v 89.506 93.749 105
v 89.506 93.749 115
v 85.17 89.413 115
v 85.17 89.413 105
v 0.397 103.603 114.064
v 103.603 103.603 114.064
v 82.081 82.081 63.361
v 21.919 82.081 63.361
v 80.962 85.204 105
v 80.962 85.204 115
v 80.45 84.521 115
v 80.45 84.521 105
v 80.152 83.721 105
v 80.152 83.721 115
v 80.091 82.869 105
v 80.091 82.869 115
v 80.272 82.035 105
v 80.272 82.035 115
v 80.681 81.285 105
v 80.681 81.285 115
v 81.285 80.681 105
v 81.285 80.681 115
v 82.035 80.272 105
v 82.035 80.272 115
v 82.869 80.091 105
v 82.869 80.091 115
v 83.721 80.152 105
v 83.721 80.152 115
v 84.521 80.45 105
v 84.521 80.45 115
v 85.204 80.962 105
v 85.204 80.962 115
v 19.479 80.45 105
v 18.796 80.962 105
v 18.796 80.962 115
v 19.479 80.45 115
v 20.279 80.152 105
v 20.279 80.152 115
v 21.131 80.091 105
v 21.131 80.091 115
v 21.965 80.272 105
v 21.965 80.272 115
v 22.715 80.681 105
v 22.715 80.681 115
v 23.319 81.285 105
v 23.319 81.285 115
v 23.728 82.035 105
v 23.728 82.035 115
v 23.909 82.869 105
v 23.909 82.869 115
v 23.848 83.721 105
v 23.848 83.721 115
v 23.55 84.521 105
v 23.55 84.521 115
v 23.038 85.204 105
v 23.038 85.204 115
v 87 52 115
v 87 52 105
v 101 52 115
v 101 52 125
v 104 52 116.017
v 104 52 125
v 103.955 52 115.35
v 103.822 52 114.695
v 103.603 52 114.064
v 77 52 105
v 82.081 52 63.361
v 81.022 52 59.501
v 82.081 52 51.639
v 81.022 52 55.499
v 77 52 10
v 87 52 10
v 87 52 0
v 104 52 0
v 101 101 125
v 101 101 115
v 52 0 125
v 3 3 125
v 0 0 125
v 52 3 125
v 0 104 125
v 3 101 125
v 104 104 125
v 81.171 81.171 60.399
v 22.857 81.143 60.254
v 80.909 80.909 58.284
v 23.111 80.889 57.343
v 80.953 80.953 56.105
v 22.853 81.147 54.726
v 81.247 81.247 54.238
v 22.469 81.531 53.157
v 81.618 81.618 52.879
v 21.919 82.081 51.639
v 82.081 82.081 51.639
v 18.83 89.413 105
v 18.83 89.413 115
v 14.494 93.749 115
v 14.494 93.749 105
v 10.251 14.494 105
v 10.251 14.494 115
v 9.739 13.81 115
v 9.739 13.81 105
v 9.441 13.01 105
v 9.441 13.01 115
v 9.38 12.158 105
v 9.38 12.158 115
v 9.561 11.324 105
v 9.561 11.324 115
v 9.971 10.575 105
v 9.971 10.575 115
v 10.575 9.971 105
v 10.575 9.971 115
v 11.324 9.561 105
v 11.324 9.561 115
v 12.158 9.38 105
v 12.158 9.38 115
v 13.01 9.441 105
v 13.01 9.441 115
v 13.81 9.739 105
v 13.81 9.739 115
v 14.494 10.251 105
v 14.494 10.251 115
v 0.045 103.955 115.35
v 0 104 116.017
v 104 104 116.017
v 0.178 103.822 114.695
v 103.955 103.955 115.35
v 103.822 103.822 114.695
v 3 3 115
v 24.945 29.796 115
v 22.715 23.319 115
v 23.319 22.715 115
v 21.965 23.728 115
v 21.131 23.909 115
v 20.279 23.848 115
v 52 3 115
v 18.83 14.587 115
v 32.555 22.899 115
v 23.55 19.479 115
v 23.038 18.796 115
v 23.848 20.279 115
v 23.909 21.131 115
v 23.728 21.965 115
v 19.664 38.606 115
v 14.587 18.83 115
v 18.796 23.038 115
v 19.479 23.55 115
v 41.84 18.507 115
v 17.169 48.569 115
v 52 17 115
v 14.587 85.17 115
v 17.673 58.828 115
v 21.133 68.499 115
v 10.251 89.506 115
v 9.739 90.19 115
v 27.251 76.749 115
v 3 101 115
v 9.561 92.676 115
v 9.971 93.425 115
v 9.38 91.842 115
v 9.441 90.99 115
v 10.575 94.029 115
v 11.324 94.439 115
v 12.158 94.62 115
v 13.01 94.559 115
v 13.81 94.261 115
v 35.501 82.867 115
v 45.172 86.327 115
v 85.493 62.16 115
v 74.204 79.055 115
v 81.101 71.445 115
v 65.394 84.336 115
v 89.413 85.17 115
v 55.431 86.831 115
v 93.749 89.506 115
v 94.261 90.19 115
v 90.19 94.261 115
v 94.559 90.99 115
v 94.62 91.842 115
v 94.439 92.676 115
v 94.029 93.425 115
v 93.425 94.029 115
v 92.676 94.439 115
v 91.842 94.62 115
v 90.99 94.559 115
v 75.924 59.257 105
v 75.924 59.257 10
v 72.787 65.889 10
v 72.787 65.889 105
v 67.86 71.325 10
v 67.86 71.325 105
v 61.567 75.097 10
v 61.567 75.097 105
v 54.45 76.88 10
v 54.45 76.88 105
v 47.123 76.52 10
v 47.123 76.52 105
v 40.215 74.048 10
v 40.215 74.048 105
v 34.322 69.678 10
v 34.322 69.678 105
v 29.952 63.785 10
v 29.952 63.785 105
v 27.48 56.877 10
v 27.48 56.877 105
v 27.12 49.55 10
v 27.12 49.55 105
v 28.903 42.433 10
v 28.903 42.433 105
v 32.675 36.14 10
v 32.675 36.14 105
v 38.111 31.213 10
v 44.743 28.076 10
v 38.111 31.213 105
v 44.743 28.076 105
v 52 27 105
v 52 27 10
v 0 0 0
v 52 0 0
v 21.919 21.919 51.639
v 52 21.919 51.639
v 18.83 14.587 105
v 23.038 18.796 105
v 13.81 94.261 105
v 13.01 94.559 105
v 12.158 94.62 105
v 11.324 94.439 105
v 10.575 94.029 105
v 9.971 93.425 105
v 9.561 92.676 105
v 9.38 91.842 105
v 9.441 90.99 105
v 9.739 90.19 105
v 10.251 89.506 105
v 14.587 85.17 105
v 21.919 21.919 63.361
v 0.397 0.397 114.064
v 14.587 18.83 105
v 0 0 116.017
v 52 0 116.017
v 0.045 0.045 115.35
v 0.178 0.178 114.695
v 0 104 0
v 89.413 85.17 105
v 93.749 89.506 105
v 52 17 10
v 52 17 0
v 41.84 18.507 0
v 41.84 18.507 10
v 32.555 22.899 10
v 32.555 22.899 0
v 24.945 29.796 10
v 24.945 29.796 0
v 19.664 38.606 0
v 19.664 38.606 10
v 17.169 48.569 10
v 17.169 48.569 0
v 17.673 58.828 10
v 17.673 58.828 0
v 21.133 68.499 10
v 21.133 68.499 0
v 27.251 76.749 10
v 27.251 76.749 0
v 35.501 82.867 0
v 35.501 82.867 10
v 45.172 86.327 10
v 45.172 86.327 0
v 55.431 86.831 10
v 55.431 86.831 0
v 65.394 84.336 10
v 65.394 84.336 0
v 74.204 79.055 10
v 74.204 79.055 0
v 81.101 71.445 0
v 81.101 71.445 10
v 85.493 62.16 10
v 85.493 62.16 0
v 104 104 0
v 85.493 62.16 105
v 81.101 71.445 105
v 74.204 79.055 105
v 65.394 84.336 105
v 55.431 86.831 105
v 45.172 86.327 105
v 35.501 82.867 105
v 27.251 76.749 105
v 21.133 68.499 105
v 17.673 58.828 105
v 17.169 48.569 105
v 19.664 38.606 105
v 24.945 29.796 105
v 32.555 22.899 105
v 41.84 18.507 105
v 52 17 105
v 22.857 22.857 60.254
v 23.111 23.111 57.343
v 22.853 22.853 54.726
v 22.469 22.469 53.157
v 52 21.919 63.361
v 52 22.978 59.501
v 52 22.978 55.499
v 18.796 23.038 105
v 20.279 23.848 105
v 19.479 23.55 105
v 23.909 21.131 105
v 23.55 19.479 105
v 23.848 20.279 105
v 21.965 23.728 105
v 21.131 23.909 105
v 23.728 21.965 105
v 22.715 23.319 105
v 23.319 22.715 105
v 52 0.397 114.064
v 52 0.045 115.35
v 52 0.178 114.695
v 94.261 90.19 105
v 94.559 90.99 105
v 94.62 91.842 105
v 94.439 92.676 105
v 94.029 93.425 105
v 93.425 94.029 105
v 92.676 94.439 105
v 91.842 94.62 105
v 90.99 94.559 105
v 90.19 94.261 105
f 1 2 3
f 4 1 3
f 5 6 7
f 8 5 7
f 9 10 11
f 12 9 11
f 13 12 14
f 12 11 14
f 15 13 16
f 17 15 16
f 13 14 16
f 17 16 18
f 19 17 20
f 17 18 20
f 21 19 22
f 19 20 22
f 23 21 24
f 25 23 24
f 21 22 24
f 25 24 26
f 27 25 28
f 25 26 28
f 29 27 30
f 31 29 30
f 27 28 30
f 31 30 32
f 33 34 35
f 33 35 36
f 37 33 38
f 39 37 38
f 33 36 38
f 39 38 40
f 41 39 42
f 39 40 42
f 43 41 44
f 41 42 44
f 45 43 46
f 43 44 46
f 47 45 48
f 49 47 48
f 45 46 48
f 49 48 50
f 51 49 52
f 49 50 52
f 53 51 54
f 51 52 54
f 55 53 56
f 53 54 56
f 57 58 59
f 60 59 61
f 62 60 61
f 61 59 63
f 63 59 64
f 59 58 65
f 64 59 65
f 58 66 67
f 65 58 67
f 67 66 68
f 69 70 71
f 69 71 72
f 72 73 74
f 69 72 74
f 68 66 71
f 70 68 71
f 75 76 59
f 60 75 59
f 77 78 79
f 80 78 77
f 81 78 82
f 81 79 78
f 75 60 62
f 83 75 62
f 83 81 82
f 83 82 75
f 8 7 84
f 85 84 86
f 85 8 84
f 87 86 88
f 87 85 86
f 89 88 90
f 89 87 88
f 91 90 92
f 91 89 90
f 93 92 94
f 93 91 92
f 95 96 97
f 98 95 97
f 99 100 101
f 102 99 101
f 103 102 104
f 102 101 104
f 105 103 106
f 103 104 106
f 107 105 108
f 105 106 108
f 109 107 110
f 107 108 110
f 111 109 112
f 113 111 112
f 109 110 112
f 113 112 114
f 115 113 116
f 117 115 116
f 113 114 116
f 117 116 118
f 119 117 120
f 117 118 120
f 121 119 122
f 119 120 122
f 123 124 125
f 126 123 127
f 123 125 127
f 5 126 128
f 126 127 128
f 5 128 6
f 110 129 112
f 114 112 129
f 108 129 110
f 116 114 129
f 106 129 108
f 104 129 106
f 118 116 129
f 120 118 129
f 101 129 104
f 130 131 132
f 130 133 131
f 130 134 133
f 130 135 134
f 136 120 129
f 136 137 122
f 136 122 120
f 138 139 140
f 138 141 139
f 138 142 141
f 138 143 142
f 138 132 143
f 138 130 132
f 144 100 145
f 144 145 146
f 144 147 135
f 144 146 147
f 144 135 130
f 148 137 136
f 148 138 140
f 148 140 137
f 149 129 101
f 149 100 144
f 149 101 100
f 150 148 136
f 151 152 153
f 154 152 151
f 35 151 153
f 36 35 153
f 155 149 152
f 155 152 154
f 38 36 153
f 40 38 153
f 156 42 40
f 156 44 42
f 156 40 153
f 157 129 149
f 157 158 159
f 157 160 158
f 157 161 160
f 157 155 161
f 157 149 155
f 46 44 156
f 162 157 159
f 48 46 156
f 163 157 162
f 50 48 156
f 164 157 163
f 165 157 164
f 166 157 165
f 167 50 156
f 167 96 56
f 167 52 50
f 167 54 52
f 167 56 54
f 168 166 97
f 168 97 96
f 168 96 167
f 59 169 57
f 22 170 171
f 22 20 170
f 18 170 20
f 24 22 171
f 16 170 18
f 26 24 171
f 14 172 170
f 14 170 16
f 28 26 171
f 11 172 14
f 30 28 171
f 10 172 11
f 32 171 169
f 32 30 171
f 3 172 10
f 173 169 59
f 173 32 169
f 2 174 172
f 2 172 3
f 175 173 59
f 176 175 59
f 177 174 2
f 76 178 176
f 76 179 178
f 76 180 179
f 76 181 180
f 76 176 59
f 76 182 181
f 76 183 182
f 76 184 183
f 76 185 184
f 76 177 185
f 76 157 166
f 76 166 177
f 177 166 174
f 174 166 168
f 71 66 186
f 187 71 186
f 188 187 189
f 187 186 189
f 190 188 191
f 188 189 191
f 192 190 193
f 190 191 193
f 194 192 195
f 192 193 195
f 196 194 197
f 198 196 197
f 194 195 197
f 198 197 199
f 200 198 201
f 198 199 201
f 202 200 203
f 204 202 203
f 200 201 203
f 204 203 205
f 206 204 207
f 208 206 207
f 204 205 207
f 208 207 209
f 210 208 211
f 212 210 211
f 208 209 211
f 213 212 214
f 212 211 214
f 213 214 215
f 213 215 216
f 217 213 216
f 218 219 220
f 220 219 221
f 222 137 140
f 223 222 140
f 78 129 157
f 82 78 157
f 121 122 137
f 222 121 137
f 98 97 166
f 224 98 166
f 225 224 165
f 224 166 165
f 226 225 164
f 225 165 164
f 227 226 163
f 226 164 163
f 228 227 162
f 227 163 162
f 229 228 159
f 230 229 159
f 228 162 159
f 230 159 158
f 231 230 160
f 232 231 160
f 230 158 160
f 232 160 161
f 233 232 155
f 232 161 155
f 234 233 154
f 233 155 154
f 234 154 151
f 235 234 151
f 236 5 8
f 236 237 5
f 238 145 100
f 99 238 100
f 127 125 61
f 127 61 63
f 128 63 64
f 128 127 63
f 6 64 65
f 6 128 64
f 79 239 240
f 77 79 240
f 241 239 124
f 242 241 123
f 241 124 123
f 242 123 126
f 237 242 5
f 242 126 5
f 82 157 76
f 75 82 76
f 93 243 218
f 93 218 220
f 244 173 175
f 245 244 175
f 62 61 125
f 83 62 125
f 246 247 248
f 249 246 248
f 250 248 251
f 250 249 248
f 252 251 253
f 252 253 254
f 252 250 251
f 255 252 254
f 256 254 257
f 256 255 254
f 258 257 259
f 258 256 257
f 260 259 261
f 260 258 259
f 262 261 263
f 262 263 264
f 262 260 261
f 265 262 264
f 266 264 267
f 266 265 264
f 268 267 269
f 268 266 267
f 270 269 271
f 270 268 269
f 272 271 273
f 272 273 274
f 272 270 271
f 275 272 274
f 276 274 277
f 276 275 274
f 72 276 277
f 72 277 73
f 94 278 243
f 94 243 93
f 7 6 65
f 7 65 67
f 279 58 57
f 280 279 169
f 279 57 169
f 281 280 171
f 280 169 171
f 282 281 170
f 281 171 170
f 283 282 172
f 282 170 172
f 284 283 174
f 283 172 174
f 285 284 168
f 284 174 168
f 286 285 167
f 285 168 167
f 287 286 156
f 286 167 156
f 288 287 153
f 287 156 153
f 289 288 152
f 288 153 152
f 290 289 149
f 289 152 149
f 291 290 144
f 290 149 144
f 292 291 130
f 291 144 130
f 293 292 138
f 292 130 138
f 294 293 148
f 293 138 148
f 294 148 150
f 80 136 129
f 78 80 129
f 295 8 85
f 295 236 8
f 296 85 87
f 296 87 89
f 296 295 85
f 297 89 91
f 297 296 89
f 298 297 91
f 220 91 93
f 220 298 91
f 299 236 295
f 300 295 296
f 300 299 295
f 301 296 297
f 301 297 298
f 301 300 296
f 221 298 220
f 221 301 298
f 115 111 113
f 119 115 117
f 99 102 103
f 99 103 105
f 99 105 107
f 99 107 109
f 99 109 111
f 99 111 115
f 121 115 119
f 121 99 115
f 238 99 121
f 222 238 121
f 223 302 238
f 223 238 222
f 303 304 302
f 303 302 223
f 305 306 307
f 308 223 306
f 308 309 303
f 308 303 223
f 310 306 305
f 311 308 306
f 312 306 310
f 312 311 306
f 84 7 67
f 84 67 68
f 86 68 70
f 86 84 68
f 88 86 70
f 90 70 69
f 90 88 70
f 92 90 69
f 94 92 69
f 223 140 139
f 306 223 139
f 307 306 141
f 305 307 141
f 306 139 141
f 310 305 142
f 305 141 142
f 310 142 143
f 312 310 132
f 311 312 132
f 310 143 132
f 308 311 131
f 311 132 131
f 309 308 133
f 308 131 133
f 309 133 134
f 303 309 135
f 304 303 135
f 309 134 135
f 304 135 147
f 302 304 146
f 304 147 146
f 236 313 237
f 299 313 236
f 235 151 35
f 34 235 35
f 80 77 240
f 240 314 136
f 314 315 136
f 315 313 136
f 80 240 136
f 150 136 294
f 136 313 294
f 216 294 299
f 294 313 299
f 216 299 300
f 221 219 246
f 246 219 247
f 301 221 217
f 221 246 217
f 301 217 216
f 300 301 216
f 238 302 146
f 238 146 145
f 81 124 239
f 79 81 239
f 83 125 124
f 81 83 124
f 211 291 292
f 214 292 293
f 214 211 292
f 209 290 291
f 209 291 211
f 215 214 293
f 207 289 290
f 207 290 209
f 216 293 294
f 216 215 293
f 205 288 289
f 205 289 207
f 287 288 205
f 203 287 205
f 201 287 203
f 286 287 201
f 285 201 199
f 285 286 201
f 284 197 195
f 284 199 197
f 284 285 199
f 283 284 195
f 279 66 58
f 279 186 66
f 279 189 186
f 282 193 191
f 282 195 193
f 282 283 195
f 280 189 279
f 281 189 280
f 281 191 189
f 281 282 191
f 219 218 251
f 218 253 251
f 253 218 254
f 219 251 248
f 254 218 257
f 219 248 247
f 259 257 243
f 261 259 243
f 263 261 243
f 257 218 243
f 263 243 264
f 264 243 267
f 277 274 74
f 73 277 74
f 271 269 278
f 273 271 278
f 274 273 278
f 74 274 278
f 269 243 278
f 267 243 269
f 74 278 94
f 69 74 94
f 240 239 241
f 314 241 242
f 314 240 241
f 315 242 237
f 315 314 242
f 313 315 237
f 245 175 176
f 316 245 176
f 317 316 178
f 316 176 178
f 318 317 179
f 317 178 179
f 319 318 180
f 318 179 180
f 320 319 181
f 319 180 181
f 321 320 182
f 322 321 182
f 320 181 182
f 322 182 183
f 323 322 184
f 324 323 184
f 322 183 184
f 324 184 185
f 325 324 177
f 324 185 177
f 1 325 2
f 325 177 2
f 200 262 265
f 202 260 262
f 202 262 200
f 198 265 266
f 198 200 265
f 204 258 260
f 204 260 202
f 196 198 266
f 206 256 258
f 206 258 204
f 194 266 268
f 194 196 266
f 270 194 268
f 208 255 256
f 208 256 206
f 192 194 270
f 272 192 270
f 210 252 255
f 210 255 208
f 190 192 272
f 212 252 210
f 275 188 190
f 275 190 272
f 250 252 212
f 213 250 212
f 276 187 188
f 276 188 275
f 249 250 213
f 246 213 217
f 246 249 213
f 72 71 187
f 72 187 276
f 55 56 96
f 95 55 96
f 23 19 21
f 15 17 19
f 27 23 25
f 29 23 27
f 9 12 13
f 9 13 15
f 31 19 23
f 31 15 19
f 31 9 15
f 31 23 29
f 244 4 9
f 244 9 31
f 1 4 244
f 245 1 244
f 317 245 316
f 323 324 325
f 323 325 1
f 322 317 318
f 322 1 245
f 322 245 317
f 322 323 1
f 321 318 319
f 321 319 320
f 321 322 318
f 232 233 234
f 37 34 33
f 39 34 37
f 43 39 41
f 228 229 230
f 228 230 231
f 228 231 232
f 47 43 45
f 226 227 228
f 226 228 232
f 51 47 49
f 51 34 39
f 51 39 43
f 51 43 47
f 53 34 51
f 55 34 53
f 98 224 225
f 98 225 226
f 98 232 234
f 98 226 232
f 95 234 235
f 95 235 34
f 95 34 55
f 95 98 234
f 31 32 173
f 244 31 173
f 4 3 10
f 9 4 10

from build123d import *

# Parameters (mm, degrees)
SKETCH1_W           = 104
SKETCH1_H           = 104
BOSS_EXTRUDE1_DEPTH = 57.5
BOSS_EXTRUDE1_TAPER = 23
SKETCH2_R           = 25
CUT_EXTRUDE1_DEPTH  = 187.70029459
SKETCH3_R           = 35
SKETCH3_R_2         = 25
CUT_EXTRUDE2_DEPTH  = 10
CUT_EXTRUDE3_START  = -10
SKETCH4_R           = 35
CUT_EXTRUDE3_DEPTH  = 10
SKETCH5_W           = 52
SKETCH5_H           = 52
CUT_EXTRUDE4_DEPTH  = 187.70029459
FILLET1_R           = 15
BOSS_EXTRUDE2_DEPTH = 10
CUT_EXTRUDE5_DEPTH  = 10
FILLET2_R           = 5


with BuildPart() as part:
    # Sketch1 → Boss-Extrude1 (new body)
    with BuildSketch(Plane.XY):
        with Locations((52, 52)):
            Rectangle(SKETCH1_W, SKETCH1_H)
    boss_extrude1 = extrude(amount=BOSS_EXTRUDE1_DEPTH, taper=BOSS_EXTRUDE1_TAPER)

    # Mirror1: Boss-Extrude1 across plane
    add(boss_extrude1.mirror(Plane.XY.offset(57.5)))

    # Sketch2 → Cut-Extrude1 (cut, through all)
    with BuildSketch(Plane.XY.offset(115)):
        with Locations((52, 52)):
            Circle(SKETCH2_R)
    extrude(amount=-CUT_EXTRUDE1_DEPTH, mode=Mode.SUBTRACT)

    # Sketch3 → Cut-Extrude2 (cut)
    with BuildSketch(Plane.XY.offset(115)):
        with Locations((52, 52)):
            Circle(SKETCH3_R)
        with Locations((52, 52)):
            Circle(SKETCH3_R_2, mode=Mode.SUBTRACT)
    extrude(amount=-CUT_EXTRUDE2_DEPTH, mode=Mode.SUBTRACT)

    # Sketch4 → Cut-Extrude3 (cut)
    with BuildSketch(Plane(origin=(0, 0, 0), x_dir=(-1, 0, 0), z_dir=(0, 0, -1)).offset(CUT_EXTRUDE3_START)):
        with Locations(Location((-52, 52, 0), (0, 0, 180))):
            Circle(SKETCH4_R)
    extrude(amount=CUT_EXTRUDE3_DEPTH, mode=Mode.SUBTRACT)

    # Sketch5 → Cut-Extrude4 (cut, through all)
    with BuildSketch(Plane.XY.offset(115)):
        with Locations((78, 26)):
            Rectangle(SKETCH5_W, SKETCH5_H)
    extrude(amount=-CUT_EXTRUDE4_DEPTH, mode=Mode.SUBTRACT)

    # Fillet1
    fillet1_edges = [part.edges().sort_by_distance(p)[0] for p in [
        (52, 79.592698068, 57.5),
        (24.407301932, 52, 57.5),
        (79.592698068, 65.796349034, 57.5),
        (38.203650966, 24.407301932, 57.5),
    ]]
    fillet(fillet1_edges, radius=FILLET1_R)

    # Sketch6 → Boss-Extrude2 (add)
    with BuildSketch(Plane.XY.offset(115)):
        Polygon((52, 0), (52, 3), (3, 3), (3, 101), (101, 101), (101, 52), (104, 52), (104, 104), (0, 104), (0, 0), align=None)
    extrude(amount=BOSS_EXTRUDE2_DEPTH)

    # Sketch7 → Cut-Extrude5 (cut)
    with BuildSketch(Plane.XY.offset(115)):
        with BuildLine():
            Line((10.251025223, 89.50633409), (14.587037586, 85.170321726))
            ThreePointArc((14.587037586, 85.170321726), (16.644660941, 87.355339059), (18.829678274, 89.412962414))
            Line((18.829678274, 89.412962414), (14.49366591, 93.748974777))
            ThreePointArc((14.49366591, 93.748974777), (10.251025223, 93.748974777), (10.251025223, 89.50633409))
        make_face()
        with BuildLine():
            Line((14.587037586, 85.170321726), (18.795655971, 80.961703342))
            ThreePointArc((18.795655971, 80.961703342), (23.038296658, 80.961703342), (23.038296658, 85.204344029))
            Line((23.038296658, 85.204344029), (18.829678274, 89.412962414))
            ThreePointArc((18.829678274, 89.412962414), (16.644660941, 87.355339059), (14.587037586, 85.170321726))
        make_face()
        with BuildLine():
            ThreePointArc((18.829678274, 14.587037586), (16.644660941, 16.644660941), (14.587037586, 18.829678274))
            Line((14.587037586, 18.829678274), (10.251025223, 14.49366591))
            ThreePointArc((10.251025223, 14.49366591), (10.251025223, 10.251025223), (14.49366591, 10.251025223))
            Line((14.49366591, 10.251025223), (18.829678274, 14.587037586))
        make_face()
        with BuildLine():
            Line((18.795655971, 23.038296658), (14.587037586, 18.829678274))
            ThreePointArc((14.587037586, 18.829678274), (16.644660941, 16.644660941), (18.829678274, 14.587037586))
            Line((18.829678274, 14.587037586), (23.038296658, 18.795655971))
            ThreePointArc((23.038296658, 18.795655971), (23.038296658, 23.038296658), (18.795655971, 23.038296658))
        make_face()
        with BuildLine():
            ThreePointArc((89.412962414, 85.170321726), (87.355339059, 87.355339059), (85.170321726, 89.412962414))
            Line((85.170321726, 89.412962414), (80.961703342, 85.204344029))
            ThreePointArc((80.961703342, 85.204344029), (80.961703342, 80.961703342), (85.204344029, 80.961703342))
            Line((85.204344029, 80.961703342), (89.412962414, 85.170321726))
        make_face()
        with BuildLine():
            Line((89.50633409, 93.748974777), (85.170321726, 89.412962414))
            ThreePointArc((85.170321726, 89.412962414), (87.355339059, 87.355339059), (89.412962414, 85.170321726))
            Line((89.412962414, 85.170321726), (93.748974777, 89.50633409))
            ThreePointArc((93.748974777, 89.50633409), (93.748974777, 93.748974777), (89.50633409, 93.748974777))
        make_face()
    extrude(amount=-CUT_EXTRUDE5_DEPTH, mode=Mode.SUBTRACT)

    # Fillet2
    fillet2_edges = [part.edges().sort_by_distance(p)[0] for p in [
        (0, 52, 115),
        (26, 0, 115),
        (52, 104, 115),
        (104, 78, 115),
    ]]
    fillet(fillet2_edges, radius=FILLET2_R)


solid = part.part
